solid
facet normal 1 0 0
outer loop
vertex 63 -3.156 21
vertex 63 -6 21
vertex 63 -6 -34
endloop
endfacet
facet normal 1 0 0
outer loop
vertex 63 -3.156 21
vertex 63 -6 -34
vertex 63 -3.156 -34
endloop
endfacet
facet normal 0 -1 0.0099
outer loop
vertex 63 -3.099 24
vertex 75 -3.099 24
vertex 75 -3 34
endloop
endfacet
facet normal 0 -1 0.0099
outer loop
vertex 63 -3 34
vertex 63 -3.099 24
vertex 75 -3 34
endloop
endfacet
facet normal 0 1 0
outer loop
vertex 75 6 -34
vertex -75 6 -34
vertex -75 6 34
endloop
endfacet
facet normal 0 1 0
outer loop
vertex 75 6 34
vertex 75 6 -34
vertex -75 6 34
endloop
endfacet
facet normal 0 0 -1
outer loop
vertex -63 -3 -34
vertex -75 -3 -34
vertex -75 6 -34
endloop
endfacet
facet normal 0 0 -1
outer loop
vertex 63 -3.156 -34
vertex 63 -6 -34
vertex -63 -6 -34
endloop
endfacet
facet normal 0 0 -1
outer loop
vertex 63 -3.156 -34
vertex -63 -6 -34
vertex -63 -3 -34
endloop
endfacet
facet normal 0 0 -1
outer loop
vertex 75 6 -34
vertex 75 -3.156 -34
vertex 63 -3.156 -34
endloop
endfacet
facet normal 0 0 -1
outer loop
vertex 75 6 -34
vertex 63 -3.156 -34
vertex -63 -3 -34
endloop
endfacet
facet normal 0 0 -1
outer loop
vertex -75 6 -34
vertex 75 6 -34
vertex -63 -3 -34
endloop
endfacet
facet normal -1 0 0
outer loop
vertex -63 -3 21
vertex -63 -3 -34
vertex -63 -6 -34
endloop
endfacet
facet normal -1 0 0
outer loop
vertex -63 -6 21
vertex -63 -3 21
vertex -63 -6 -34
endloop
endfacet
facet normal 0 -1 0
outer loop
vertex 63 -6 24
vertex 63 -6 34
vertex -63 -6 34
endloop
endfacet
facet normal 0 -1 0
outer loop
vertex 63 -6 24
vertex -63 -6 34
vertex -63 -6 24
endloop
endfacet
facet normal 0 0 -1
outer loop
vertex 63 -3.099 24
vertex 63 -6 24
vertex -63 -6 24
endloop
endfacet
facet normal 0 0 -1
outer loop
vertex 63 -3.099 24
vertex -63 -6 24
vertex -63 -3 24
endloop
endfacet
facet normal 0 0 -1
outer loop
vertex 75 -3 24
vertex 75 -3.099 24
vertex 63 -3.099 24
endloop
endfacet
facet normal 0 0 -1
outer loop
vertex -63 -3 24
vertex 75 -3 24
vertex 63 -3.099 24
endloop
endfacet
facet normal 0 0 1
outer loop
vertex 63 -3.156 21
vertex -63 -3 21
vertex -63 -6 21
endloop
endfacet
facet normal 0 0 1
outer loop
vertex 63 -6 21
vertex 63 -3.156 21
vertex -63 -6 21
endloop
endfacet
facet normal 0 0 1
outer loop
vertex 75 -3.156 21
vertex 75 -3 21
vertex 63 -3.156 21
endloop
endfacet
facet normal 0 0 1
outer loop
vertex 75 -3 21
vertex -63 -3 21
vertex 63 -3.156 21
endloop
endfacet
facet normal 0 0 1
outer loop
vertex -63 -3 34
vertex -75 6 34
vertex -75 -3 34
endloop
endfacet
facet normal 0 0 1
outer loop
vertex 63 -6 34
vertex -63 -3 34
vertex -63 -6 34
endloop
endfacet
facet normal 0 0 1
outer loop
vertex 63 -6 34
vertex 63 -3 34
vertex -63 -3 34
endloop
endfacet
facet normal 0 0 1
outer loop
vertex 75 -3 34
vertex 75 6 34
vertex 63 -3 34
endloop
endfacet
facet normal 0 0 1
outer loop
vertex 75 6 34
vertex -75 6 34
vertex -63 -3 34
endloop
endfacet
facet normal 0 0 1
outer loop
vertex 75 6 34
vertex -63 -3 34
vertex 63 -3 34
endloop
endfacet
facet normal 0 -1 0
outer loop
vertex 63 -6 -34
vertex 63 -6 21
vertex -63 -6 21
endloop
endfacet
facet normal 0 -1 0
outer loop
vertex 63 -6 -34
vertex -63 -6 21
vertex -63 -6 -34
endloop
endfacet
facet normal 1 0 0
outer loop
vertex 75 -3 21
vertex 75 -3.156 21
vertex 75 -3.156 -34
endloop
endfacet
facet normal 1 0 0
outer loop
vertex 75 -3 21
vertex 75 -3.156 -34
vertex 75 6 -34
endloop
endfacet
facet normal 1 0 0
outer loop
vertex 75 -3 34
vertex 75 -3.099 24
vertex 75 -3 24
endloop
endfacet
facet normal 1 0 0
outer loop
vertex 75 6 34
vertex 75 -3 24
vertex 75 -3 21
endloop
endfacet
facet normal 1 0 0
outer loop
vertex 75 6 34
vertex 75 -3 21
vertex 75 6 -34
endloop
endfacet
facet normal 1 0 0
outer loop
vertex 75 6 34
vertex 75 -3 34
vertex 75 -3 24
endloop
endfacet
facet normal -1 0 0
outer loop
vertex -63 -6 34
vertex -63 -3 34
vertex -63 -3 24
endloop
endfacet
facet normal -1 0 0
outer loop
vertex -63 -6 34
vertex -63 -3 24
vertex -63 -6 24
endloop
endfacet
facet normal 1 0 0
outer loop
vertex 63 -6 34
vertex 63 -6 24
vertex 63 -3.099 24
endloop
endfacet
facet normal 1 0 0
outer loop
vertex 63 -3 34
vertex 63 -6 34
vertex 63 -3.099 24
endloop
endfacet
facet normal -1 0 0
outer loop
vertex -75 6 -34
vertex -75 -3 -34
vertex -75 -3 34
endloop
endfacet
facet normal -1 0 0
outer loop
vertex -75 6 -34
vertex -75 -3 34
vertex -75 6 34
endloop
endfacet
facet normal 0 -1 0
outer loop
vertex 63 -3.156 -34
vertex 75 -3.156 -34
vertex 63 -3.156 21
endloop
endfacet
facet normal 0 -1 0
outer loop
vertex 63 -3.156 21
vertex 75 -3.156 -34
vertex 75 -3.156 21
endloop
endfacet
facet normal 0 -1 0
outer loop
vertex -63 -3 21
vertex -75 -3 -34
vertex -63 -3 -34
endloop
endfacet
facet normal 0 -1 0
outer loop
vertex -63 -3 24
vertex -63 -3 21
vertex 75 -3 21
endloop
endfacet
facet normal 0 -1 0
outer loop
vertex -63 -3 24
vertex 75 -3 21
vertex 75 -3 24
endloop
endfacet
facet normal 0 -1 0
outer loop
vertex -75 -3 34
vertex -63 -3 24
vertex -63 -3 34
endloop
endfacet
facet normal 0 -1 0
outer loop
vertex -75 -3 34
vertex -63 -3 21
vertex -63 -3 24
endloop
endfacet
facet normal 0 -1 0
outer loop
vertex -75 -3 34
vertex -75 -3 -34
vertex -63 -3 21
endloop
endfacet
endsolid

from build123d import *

# Parameters (mm, degrees)
F1_DEPTH = 75
F2_W     = 2.844389
F2_H     = 55
F3_DEPTH = 12
F5_DEPTH = 12
F6_W     = 3
F6_H     = 55
F6_H_2   = 10
F7_DEPTH = 12


with BuildPart() as f1:
    # F0 (on Right) → F1 (new body, symmetric)
    with BuildSketch(Plane.YZ):
        Polygon((-6, -34), (6, -34), (6, 34), (-6, 34), (-6, 24), (-3, 24), (-3, 21), (-6, 21), align=None)
    extrude(amount=F1_DEPTH, both=True)

    # F2 (on face) → F3 (cut)
    with BuildSketch(Plane.YZ.offset(75)):
        with Locations((-4.577806, -6.5)):
            Rectangle(F2_W, F2_H)
    extrude(amount=-F3_DEPTH, mode=Mode.SUBTRACT)

    # F4 (on face) → F5 (cut)
    with BuildSketch(Plane.YZ.offset(75)):
        Polygon((-6, 24), (-3.098777, 24), (-3, 34), (-6, 34), align=None)
    extrude(amount=-F5_DEPTH, mode=Mode.SUBTRACT)

    # F6 (on face) → F7 (cut)
    with BuildSketch(Plane(origin=(-75, 0, 0), x_dir=(0, -1, 0), z_dir=(-1, 0, 0))):
        with Locations((4.5, -6.5)):
            Rectangle(F6_W, F6_H)
        with Locations((4.5, 29)):
            Rectangle(F6_W, F6_H_2)
    extrude(amount=-F7_DEPTH, mode=Mode.SUBTRACT)


solid = f1.part
